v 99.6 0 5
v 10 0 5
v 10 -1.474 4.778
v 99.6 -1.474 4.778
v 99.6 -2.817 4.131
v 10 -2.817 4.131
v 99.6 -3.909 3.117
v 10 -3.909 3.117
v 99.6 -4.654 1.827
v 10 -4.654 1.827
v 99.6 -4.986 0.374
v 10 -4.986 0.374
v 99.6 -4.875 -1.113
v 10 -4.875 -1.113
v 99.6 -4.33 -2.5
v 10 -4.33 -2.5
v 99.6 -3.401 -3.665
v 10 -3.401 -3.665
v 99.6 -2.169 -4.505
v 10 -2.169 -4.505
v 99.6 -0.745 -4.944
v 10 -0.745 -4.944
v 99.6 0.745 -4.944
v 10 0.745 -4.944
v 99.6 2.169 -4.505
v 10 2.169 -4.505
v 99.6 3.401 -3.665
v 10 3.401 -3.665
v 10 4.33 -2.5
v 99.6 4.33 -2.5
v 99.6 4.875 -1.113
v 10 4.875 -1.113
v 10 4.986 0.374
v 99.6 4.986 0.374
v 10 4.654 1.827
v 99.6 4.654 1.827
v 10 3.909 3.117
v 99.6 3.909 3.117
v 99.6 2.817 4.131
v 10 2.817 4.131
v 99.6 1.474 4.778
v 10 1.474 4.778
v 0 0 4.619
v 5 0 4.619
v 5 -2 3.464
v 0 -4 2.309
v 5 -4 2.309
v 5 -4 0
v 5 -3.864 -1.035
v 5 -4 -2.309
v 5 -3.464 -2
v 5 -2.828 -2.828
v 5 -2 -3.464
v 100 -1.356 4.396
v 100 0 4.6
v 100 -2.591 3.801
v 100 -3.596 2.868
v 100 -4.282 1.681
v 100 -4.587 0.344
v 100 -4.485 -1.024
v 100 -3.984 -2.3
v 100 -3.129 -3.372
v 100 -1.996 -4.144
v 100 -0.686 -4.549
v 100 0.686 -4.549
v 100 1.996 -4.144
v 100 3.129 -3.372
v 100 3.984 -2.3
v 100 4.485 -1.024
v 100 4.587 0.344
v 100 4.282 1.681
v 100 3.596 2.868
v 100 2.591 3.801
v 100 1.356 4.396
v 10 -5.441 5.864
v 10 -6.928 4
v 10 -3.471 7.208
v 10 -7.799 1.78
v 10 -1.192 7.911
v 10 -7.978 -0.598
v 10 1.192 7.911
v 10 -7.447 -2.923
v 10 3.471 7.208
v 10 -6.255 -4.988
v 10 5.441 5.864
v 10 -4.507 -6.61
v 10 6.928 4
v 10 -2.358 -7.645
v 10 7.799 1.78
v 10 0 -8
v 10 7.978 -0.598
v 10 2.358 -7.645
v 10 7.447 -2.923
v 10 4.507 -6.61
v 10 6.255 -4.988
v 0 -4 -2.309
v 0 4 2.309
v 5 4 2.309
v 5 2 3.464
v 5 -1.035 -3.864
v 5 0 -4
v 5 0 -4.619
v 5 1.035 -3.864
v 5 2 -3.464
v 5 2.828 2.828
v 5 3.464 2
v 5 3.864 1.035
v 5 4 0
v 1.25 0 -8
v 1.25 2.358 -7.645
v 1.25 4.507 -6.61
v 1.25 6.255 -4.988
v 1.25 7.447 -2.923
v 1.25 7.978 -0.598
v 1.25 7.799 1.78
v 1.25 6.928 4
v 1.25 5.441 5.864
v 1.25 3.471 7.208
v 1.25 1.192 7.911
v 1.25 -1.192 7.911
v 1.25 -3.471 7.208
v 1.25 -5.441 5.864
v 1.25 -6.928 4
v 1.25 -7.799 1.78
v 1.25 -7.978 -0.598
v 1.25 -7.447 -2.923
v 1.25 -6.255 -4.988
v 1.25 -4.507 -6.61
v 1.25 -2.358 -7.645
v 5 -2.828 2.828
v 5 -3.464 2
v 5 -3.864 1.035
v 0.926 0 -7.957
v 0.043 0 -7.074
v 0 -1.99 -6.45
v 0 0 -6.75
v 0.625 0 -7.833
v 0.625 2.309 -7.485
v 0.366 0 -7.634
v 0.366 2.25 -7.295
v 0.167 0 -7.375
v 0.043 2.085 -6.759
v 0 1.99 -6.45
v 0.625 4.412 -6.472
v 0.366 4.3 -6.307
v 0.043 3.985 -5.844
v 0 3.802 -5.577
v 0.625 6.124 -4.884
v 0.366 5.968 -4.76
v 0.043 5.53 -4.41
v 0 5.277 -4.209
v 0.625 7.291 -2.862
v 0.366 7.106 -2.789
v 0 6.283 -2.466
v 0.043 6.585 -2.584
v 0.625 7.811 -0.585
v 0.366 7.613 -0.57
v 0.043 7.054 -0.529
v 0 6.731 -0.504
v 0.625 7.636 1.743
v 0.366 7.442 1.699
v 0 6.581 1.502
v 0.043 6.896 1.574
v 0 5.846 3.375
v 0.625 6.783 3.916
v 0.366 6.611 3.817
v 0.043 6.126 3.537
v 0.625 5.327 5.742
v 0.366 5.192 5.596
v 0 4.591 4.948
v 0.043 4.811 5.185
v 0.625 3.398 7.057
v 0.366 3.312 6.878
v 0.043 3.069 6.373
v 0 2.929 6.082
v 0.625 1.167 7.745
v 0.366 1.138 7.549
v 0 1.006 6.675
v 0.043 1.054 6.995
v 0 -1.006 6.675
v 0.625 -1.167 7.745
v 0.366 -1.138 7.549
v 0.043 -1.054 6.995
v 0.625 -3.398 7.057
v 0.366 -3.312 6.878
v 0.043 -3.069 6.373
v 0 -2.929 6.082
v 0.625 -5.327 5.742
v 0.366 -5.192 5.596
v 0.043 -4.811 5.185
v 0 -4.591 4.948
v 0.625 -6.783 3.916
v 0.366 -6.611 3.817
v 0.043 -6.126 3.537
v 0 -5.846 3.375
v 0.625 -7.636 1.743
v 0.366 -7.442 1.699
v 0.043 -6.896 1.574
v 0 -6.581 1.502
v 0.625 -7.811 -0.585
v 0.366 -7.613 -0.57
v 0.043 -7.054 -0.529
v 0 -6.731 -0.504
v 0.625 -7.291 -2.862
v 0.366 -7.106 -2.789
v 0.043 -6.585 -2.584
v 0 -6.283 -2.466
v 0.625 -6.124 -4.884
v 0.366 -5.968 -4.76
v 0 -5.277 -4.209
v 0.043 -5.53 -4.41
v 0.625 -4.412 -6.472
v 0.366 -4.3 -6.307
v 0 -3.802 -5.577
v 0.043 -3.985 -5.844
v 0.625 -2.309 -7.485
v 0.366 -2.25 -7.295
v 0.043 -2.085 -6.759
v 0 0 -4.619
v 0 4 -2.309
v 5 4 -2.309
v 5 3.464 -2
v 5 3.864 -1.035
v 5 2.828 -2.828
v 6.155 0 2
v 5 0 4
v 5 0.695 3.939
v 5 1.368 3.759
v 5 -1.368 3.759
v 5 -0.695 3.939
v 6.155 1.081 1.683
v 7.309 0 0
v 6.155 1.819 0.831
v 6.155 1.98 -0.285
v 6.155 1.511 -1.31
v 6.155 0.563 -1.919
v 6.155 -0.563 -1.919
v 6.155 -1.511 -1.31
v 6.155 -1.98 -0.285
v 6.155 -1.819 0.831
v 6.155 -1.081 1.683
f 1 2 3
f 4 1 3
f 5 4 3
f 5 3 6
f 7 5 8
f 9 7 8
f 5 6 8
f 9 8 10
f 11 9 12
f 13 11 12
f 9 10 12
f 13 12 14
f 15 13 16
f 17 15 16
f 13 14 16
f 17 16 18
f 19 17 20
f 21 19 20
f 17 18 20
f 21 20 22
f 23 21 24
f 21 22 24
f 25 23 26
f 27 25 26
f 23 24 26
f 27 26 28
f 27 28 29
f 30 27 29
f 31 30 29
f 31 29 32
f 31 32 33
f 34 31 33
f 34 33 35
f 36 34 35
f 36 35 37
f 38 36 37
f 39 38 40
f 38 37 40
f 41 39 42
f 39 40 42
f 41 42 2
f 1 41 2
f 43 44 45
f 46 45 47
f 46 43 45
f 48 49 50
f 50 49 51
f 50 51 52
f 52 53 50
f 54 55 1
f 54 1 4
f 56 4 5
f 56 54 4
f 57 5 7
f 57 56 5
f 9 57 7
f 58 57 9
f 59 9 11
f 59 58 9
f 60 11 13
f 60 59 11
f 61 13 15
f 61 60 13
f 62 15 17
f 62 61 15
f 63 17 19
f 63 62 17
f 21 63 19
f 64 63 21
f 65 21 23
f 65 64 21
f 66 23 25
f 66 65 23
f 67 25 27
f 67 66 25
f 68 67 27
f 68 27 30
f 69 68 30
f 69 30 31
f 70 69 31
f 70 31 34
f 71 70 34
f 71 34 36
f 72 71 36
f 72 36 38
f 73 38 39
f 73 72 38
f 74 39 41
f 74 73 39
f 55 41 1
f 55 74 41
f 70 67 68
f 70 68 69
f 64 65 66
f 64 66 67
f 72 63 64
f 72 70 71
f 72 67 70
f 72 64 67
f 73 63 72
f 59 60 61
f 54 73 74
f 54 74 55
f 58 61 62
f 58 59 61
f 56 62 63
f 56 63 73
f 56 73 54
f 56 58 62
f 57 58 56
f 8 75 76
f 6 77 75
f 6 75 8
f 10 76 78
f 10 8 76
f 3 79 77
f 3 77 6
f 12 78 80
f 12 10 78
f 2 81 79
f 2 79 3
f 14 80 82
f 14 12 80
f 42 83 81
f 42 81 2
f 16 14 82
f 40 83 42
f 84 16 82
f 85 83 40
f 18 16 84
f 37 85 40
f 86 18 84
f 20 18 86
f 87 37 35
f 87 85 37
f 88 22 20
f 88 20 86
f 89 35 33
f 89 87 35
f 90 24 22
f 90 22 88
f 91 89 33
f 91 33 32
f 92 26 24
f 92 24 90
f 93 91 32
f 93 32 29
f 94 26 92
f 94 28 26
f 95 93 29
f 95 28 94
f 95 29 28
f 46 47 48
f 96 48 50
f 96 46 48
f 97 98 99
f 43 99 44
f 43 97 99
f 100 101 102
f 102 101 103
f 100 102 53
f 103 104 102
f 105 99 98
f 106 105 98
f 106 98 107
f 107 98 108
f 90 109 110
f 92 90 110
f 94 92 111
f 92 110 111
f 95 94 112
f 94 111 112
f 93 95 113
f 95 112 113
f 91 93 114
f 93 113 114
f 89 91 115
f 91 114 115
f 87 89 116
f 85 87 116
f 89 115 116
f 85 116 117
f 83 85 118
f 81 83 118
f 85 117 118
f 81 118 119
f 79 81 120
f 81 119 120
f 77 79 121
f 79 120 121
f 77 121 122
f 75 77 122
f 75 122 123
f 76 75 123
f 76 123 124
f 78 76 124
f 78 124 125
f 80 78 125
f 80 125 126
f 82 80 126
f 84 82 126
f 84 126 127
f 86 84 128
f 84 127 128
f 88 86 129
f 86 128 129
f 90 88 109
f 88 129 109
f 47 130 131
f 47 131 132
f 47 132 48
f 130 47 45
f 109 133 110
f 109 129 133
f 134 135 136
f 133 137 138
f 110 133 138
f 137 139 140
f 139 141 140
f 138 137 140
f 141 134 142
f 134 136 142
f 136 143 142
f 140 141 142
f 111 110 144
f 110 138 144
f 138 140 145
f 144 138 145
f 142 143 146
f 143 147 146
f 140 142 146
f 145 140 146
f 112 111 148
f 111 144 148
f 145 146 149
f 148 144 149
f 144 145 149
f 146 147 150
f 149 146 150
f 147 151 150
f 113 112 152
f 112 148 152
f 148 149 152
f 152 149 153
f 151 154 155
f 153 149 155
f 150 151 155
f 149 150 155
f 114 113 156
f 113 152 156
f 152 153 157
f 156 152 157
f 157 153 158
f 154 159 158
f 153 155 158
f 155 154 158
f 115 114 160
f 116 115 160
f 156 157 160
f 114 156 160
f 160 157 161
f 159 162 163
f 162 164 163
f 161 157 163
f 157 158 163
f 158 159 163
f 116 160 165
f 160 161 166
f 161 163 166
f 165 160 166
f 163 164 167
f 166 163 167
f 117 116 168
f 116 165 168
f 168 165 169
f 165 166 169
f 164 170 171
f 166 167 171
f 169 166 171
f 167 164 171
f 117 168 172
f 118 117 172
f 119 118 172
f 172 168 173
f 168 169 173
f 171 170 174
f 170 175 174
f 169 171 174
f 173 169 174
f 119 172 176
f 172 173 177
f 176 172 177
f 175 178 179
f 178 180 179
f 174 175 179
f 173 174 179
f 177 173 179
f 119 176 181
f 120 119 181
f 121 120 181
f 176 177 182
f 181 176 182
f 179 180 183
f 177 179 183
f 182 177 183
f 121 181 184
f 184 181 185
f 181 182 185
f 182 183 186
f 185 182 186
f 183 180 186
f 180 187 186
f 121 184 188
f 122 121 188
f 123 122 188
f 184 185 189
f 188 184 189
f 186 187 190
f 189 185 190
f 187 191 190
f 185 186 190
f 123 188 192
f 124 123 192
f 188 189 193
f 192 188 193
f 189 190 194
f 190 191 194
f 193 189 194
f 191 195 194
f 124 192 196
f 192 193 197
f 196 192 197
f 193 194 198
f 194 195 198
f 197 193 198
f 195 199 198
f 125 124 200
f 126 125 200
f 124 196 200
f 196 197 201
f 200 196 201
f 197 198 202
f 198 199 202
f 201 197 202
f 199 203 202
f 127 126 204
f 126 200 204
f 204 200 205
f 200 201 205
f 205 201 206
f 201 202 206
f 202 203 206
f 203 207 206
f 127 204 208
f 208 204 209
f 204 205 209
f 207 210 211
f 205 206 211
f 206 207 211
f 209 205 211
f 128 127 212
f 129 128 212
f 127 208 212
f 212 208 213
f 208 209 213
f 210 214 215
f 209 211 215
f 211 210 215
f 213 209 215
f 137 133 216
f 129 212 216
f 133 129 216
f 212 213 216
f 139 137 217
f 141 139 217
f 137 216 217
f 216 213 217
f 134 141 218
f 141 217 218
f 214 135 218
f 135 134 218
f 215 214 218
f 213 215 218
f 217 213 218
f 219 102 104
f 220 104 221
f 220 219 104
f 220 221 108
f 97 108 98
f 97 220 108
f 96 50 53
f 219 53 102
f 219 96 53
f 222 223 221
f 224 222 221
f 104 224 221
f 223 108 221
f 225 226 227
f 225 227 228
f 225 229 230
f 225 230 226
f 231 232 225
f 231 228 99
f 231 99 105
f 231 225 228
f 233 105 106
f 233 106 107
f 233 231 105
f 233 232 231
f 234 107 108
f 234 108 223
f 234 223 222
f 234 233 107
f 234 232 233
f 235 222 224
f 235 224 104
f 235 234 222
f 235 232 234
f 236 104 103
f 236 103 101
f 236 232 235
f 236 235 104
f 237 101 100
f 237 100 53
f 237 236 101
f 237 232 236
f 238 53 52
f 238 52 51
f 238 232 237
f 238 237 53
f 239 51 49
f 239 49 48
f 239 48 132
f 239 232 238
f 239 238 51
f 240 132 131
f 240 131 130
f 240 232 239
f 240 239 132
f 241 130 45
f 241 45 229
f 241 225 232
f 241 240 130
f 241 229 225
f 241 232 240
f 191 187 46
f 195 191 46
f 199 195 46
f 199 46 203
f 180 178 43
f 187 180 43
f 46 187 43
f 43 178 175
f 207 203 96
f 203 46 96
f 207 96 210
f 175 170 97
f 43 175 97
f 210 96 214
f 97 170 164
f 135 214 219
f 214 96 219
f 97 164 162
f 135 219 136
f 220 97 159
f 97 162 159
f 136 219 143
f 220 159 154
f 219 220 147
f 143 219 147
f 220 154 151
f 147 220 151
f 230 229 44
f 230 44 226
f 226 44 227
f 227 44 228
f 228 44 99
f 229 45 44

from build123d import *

# Parameters (mm, degrees)
SKETCH1_R           = 8
BASEHEAD_DEPTH      = 10
SKETCH2_R           = 5
BASEBODY_DEPTH      = 90
HEXAGONSOCKET_DEPTH = 5
TOPFILLET_R         = 1.25
CHAMFER1_SIZE       = 0.4


with BuildPart() as part:
    # Sketch1 → BaseHead (new body)
    with BuildSketch(Plane(origin=(0, 0, 0), x_dir=(0, 0, -1), z_dir=(1, 0, 0))):
        Circle(SKETCH1_R)
    extrude(amount=BASEHEAD_DEPTH)

    # Sketch2 → BaseBody (add)
    with BuildSketch(Plane(origin=(10, 0, 0), x_dir=(0, 0, -1), z_dir=(1, 0, 0))):
        with Locations(Location((0, 0, 0), (0, 0, 180))):
            Circle(SKETCH2_R)
    extrude(amount=BASEBODY_DEPTH)

    # Sketch3 → HexagonSocket (cut)
    with BuildSketch(Plane(origin=(0, 0, 0), x_dir=(0, 0, -1), z_dir=(1, 0, 0))):
        Polygon((4.618802154, 0), (2.309401077, 4), (-2.309401077, 4), (-4.618802154, 0), (-2.309401077, -4), (2.309401077, -4), align=None)
    extrude(amount=HEXAGONSOCKET_DEPTH, mode=Mode.SUBTRACT)

    # Sketch4 → Cut-Revolve1 (revolve, cut)
    with BuildSketch(Plane(origin=(-4.19613823, 0.75, 0), x_dir=(-1, 0, 0), z_dir=(0, 0, 1)), mode=Mode.PRIVATE) as cut_revolve1_sk:
        Polygon((-9.19613823, 4.75), (-11.505539306, 0.75), (-9.19613823, 0.75), align=None)
    revolve(cut_revolve1_sk.sketch.rotate(Axis((0.838992387, 0, 0), (-1, 0, 0)), 90), axis=Axis((0.838992387, 0, 0), (-1, 0, 0)), mode=Mode.SUBTRACT)

    # TopFillet
    topfillet_edges = [part.edges().sort_by_distance(p)[0] for p in [
        (0, 0, 8),
    ]]
    fillet(topfillet_edges, radius=TOPFILLET_R)

    # Chamfer1
    chamfer1_edges = [part.edges().sort_by_distance(p)[0] for p in [
        (100, 0, -5),
    ]]
    chamfer(chamfer1_edges, length=CHAMFER1_SIZE)


solid = part.part
